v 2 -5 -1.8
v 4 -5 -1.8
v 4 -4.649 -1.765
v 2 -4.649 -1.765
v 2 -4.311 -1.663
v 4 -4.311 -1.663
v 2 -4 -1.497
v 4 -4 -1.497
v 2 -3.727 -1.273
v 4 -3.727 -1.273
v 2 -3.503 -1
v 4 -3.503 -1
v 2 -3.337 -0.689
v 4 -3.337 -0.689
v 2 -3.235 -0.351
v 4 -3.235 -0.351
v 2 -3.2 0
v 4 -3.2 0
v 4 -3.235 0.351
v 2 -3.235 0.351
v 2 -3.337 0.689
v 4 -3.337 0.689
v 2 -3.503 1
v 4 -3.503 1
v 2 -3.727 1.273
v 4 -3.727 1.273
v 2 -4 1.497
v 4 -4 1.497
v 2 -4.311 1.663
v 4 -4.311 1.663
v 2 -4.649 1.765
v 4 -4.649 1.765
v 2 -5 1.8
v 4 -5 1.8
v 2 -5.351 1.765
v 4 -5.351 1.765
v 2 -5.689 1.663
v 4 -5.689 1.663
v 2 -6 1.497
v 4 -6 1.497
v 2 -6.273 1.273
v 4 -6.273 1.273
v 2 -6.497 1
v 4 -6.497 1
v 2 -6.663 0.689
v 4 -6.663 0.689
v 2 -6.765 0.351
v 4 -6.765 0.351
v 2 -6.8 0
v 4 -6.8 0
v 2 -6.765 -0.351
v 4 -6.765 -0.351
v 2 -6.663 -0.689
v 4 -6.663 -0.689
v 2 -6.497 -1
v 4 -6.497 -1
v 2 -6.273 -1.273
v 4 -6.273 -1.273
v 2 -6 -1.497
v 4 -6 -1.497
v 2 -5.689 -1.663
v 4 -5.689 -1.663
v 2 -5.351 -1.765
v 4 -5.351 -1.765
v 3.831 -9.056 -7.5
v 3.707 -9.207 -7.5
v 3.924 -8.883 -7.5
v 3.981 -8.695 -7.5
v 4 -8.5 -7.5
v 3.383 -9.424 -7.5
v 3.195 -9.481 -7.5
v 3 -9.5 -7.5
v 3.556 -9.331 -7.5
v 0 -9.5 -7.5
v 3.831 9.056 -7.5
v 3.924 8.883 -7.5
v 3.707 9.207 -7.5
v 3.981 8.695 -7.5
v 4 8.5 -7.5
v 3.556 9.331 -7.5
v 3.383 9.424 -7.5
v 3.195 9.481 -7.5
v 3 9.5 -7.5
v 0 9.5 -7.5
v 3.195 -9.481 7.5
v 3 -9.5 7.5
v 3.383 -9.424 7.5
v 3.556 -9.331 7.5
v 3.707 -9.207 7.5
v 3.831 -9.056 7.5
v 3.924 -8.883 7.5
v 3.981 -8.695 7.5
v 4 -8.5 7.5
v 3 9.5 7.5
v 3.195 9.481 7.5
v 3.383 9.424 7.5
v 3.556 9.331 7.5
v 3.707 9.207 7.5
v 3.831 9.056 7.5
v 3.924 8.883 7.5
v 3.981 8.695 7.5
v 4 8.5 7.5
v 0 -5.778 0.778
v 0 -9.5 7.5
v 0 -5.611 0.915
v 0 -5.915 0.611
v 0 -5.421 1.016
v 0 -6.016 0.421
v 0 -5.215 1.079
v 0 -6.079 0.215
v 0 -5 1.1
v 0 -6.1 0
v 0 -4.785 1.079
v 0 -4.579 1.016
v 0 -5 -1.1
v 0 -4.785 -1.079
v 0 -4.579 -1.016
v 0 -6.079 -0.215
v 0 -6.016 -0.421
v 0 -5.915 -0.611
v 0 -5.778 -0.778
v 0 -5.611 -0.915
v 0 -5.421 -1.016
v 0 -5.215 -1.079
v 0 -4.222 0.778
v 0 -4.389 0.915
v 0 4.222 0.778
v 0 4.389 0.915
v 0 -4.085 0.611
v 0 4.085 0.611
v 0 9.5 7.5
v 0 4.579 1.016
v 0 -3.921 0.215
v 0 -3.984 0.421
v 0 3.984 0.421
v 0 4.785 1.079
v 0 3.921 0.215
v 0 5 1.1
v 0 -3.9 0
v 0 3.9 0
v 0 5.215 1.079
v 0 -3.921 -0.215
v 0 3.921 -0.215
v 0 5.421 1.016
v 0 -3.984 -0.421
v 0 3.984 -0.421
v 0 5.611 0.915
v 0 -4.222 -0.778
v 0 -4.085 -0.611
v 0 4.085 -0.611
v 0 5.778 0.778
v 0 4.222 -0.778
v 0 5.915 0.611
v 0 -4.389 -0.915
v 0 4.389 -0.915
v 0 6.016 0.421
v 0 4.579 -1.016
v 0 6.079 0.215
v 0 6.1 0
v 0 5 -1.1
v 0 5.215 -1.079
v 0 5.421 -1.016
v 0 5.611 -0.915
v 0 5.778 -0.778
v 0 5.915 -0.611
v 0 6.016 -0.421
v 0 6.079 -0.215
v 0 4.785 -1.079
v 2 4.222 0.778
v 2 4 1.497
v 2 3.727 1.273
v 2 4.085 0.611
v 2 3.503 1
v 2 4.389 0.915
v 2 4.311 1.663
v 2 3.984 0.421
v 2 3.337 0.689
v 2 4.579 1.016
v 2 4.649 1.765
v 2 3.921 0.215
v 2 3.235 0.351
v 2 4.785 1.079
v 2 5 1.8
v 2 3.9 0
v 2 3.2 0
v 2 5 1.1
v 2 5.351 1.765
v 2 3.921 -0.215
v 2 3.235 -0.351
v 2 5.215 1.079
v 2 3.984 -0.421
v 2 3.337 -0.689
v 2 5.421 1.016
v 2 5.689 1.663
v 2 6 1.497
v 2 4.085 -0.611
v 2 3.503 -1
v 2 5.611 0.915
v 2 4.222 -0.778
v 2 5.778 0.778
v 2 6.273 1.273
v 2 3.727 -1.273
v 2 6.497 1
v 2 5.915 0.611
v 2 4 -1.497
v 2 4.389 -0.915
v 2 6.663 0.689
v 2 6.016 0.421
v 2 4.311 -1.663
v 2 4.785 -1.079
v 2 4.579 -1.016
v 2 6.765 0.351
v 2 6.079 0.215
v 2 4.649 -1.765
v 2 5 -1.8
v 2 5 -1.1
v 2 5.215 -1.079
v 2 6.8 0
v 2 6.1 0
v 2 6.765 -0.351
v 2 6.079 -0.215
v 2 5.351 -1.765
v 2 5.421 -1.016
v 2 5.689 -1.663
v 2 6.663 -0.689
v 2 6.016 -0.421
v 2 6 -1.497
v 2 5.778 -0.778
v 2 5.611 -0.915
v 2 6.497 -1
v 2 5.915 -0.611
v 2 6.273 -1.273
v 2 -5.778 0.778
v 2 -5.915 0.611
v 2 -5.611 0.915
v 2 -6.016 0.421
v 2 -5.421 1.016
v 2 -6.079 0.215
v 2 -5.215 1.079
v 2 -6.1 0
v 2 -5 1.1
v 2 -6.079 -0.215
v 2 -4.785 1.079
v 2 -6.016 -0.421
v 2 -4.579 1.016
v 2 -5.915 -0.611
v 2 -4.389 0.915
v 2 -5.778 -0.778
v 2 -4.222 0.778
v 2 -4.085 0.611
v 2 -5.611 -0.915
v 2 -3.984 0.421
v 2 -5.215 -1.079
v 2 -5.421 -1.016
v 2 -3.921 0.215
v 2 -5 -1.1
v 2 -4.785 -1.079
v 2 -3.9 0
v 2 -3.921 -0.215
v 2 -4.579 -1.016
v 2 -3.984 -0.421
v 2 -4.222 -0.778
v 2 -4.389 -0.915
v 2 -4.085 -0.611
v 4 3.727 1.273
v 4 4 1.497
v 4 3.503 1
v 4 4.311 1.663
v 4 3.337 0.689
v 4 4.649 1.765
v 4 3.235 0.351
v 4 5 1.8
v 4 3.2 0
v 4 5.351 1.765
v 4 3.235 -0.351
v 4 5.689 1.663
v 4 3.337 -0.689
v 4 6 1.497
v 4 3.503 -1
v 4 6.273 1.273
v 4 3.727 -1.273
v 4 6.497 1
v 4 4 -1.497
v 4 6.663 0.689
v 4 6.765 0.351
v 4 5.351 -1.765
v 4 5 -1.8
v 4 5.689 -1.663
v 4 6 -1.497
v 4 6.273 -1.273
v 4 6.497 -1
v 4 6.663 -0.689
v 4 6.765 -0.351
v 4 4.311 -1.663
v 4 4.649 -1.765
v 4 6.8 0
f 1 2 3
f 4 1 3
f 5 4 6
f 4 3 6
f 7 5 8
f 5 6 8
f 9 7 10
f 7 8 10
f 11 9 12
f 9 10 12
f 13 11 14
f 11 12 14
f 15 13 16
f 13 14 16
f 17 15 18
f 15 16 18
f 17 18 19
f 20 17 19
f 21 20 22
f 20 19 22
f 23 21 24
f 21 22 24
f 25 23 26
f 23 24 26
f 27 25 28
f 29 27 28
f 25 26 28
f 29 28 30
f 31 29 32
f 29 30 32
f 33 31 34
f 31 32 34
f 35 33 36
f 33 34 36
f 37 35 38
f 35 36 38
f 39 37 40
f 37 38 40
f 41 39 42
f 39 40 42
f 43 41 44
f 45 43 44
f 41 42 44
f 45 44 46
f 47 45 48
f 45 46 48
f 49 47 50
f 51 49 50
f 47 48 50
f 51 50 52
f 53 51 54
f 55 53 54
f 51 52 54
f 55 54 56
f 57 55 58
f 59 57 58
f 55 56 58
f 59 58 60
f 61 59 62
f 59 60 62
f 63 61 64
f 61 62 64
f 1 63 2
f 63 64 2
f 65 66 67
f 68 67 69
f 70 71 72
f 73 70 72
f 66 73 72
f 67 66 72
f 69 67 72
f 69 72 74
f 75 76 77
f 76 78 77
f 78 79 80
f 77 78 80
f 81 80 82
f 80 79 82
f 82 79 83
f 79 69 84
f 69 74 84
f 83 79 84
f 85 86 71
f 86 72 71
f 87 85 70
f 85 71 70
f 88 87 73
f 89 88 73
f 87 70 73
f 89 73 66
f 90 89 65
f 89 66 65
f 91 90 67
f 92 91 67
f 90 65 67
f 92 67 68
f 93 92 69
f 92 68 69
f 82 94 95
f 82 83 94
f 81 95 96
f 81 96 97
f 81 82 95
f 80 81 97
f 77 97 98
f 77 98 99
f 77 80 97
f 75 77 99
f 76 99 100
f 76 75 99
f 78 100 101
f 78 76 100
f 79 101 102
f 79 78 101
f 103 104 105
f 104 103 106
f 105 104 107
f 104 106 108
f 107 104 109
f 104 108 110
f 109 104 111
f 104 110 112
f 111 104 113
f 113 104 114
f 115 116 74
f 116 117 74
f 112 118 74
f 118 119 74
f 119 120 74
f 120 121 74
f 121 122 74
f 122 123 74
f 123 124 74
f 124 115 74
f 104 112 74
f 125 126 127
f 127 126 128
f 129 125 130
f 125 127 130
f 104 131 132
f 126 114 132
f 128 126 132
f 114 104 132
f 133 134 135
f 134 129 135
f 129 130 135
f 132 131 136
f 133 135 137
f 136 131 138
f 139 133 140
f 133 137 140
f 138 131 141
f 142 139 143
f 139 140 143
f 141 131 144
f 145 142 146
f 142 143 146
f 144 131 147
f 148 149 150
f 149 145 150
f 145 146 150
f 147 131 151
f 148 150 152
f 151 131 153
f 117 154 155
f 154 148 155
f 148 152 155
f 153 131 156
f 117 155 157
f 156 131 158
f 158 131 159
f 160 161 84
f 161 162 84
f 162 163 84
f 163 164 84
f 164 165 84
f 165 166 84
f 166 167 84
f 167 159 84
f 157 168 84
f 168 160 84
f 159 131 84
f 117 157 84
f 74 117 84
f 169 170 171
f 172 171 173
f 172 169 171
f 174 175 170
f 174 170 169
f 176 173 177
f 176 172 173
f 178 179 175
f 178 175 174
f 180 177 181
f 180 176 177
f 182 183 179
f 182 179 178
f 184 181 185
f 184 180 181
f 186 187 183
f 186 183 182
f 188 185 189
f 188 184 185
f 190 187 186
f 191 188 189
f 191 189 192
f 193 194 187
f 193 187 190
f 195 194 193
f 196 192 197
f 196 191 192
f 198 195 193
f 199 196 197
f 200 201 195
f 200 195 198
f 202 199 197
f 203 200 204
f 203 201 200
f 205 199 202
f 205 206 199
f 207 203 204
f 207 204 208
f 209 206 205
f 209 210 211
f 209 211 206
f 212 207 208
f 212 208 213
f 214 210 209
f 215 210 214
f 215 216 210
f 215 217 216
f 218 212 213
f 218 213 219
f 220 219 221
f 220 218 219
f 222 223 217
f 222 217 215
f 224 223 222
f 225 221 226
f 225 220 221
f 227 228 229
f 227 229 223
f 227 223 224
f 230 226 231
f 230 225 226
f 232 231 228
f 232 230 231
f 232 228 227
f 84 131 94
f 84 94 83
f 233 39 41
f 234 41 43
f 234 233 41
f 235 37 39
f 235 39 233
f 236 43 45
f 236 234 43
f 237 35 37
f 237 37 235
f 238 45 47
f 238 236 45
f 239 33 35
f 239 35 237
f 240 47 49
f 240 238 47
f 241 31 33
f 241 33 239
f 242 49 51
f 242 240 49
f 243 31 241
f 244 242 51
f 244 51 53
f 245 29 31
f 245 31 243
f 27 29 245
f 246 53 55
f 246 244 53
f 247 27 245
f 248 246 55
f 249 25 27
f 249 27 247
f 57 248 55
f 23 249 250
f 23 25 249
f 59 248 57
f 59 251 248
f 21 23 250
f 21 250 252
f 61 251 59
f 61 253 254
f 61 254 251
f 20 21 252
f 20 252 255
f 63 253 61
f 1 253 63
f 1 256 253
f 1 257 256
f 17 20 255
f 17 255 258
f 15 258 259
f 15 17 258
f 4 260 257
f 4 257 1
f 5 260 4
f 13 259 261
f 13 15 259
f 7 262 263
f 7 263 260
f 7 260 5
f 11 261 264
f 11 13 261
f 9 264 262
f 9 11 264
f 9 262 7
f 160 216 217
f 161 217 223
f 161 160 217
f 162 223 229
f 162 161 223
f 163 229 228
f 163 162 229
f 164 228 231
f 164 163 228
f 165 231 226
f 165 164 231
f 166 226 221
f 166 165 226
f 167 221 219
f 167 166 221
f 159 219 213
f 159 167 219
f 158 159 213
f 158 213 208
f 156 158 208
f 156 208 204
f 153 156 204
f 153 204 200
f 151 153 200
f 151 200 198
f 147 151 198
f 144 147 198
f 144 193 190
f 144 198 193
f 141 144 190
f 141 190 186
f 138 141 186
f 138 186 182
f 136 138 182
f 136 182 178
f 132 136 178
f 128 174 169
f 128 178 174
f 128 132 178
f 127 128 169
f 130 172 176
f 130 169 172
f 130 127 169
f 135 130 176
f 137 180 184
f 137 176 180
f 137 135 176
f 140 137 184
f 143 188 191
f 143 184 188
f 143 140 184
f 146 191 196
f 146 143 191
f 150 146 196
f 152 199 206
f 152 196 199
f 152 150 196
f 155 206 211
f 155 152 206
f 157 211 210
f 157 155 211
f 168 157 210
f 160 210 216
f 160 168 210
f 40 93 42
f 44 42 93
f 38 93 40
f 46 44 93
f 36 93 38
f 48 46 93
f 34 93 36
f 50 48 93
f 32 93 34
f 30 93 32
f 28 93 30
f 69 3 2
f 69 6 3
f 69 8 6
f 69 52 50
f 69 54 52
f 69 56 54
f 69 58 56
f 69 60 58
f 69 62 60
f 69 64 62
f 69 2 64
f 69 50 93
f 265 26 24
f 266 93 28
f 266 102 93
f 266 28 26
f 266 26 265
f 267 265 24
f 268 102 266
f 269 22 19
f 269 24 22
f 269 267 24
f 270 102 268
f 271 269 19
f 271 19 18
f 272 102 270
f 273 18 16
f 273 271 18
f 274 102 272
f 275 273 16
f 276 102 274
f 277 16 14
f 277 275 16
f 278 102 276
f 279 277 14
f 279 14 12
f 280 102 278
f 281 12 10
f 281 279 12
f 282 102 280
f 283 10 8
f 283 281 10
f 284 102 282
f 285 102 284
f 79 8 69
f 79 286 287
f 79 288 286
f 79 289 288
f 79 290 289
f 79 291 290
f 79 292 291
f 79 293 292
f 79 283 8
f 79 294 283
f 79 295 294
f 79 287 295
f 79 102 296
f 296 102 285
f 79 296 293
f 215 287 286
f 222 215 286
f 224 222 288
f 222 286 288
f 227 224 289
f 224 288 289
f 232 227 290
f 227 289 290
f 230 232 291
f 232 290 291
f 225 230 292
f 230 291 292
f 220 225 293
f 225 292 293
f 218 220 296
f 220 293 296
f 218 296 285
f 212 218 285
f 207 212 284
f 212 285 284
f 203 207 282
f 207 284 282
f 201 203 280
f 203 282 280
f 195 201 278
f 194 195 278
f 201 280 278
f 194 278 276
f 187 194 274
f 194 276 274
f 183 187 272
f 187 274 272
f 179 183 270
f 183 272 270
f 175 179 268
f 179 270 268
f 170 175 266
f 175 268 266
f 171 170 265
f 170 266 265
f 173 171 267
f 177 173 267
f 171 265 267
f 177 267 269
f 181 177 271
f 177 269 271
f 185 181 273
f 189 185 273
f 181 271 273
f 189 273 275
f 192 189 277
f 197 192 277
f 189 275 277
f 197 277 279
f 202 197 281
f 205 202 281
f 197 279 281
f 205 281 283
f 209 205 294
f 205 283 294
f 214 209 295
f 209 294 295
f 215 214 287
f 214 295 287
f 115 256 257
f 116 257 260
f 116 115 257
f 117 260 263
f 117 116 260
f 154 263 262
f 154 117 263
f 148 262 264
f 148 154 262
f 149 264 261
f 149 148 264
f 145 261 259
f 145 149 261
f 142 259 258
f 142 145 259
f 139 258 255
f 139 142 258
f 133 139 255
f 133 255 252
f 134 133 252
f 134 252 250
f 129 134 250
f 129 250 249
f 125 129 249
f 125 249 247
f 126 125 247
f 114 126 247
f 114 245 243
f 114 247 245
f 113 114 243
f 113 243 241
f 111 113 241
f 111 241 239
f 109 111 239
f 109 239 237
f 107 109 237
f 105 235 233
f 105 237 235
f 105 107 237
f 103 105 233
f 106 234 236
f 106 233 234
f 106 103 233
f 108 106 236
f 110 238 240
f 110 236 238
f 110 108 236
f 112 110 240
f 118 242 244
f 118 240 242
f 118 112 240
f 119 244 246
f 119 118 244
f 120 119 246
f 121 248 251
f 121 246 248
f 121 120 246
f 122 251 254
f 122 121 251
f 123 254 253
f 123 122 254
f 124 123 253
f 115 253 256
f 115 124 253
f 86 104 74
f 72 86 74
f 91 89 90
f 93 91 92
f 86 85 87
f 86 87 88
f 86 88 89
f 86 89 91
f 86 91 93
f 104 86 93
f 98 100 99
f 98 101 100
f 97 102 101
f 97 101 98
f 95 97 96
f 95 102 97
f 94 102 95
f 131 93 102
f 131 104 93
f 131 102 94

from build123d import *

# Parameters (mm, degrees)
SKETCH_1_W          = 15
SKETCH_1_H          = 19
SKETCH_1_R          = 1.1
EXTRUDE_1_DEPTH     = 4
SKETCH_2_R          = 1.8
CUT_EXTRUDE_1_DEPTH = 2
FILLET_1_R          = 1


with BuildPart() as part:
    # Эскиз1 → Бобышка-Вытянуть1 (new body)
    with BuildSketch(Plane(origin=(0, 0, 0), x_dir=(0, 0, -1), z_dir=(1, 0, 0))):
        Rectangle(SKETCH_1_W, SKETCH_1_H)
        with Locations((0, 5)):
            Circle(SKETCH_1_R, mode=Mode.SUBTRACT)
        with Locations((0, -5)):
            Circle(SKETCH_1_R, mode=Mode.SUBTRACT)
    extrude(amount=EXTRUDE_1_DEPTH)

    # Эскиз2 → Вырез-Вытянуть1 (cut)
    with BuildSketch(Plane(origin=(4, 0, 0), x_dir=(0, 0, -1), z_dir=(1, 0, 0))):
        with Locations((0, 5)):
            Circle(SKETCH_2_R)
        with Locations((0, -5)):
            Circle(SKETCH_2_R)
    extrude(amount=-CUT_EXTRUDE_1_DEPTH, mode=Mode.SUBTRACT)

    # Скругление1
    fillet_1_edges = [part.edges().sort_by_distance(p)[0] for p in [
        (4, -9.5, 0),
        (4, 9.5, 0),
    ]]
    fillet(fillet_1_edges, radius=FILLET_1_R)


solid = part.part
